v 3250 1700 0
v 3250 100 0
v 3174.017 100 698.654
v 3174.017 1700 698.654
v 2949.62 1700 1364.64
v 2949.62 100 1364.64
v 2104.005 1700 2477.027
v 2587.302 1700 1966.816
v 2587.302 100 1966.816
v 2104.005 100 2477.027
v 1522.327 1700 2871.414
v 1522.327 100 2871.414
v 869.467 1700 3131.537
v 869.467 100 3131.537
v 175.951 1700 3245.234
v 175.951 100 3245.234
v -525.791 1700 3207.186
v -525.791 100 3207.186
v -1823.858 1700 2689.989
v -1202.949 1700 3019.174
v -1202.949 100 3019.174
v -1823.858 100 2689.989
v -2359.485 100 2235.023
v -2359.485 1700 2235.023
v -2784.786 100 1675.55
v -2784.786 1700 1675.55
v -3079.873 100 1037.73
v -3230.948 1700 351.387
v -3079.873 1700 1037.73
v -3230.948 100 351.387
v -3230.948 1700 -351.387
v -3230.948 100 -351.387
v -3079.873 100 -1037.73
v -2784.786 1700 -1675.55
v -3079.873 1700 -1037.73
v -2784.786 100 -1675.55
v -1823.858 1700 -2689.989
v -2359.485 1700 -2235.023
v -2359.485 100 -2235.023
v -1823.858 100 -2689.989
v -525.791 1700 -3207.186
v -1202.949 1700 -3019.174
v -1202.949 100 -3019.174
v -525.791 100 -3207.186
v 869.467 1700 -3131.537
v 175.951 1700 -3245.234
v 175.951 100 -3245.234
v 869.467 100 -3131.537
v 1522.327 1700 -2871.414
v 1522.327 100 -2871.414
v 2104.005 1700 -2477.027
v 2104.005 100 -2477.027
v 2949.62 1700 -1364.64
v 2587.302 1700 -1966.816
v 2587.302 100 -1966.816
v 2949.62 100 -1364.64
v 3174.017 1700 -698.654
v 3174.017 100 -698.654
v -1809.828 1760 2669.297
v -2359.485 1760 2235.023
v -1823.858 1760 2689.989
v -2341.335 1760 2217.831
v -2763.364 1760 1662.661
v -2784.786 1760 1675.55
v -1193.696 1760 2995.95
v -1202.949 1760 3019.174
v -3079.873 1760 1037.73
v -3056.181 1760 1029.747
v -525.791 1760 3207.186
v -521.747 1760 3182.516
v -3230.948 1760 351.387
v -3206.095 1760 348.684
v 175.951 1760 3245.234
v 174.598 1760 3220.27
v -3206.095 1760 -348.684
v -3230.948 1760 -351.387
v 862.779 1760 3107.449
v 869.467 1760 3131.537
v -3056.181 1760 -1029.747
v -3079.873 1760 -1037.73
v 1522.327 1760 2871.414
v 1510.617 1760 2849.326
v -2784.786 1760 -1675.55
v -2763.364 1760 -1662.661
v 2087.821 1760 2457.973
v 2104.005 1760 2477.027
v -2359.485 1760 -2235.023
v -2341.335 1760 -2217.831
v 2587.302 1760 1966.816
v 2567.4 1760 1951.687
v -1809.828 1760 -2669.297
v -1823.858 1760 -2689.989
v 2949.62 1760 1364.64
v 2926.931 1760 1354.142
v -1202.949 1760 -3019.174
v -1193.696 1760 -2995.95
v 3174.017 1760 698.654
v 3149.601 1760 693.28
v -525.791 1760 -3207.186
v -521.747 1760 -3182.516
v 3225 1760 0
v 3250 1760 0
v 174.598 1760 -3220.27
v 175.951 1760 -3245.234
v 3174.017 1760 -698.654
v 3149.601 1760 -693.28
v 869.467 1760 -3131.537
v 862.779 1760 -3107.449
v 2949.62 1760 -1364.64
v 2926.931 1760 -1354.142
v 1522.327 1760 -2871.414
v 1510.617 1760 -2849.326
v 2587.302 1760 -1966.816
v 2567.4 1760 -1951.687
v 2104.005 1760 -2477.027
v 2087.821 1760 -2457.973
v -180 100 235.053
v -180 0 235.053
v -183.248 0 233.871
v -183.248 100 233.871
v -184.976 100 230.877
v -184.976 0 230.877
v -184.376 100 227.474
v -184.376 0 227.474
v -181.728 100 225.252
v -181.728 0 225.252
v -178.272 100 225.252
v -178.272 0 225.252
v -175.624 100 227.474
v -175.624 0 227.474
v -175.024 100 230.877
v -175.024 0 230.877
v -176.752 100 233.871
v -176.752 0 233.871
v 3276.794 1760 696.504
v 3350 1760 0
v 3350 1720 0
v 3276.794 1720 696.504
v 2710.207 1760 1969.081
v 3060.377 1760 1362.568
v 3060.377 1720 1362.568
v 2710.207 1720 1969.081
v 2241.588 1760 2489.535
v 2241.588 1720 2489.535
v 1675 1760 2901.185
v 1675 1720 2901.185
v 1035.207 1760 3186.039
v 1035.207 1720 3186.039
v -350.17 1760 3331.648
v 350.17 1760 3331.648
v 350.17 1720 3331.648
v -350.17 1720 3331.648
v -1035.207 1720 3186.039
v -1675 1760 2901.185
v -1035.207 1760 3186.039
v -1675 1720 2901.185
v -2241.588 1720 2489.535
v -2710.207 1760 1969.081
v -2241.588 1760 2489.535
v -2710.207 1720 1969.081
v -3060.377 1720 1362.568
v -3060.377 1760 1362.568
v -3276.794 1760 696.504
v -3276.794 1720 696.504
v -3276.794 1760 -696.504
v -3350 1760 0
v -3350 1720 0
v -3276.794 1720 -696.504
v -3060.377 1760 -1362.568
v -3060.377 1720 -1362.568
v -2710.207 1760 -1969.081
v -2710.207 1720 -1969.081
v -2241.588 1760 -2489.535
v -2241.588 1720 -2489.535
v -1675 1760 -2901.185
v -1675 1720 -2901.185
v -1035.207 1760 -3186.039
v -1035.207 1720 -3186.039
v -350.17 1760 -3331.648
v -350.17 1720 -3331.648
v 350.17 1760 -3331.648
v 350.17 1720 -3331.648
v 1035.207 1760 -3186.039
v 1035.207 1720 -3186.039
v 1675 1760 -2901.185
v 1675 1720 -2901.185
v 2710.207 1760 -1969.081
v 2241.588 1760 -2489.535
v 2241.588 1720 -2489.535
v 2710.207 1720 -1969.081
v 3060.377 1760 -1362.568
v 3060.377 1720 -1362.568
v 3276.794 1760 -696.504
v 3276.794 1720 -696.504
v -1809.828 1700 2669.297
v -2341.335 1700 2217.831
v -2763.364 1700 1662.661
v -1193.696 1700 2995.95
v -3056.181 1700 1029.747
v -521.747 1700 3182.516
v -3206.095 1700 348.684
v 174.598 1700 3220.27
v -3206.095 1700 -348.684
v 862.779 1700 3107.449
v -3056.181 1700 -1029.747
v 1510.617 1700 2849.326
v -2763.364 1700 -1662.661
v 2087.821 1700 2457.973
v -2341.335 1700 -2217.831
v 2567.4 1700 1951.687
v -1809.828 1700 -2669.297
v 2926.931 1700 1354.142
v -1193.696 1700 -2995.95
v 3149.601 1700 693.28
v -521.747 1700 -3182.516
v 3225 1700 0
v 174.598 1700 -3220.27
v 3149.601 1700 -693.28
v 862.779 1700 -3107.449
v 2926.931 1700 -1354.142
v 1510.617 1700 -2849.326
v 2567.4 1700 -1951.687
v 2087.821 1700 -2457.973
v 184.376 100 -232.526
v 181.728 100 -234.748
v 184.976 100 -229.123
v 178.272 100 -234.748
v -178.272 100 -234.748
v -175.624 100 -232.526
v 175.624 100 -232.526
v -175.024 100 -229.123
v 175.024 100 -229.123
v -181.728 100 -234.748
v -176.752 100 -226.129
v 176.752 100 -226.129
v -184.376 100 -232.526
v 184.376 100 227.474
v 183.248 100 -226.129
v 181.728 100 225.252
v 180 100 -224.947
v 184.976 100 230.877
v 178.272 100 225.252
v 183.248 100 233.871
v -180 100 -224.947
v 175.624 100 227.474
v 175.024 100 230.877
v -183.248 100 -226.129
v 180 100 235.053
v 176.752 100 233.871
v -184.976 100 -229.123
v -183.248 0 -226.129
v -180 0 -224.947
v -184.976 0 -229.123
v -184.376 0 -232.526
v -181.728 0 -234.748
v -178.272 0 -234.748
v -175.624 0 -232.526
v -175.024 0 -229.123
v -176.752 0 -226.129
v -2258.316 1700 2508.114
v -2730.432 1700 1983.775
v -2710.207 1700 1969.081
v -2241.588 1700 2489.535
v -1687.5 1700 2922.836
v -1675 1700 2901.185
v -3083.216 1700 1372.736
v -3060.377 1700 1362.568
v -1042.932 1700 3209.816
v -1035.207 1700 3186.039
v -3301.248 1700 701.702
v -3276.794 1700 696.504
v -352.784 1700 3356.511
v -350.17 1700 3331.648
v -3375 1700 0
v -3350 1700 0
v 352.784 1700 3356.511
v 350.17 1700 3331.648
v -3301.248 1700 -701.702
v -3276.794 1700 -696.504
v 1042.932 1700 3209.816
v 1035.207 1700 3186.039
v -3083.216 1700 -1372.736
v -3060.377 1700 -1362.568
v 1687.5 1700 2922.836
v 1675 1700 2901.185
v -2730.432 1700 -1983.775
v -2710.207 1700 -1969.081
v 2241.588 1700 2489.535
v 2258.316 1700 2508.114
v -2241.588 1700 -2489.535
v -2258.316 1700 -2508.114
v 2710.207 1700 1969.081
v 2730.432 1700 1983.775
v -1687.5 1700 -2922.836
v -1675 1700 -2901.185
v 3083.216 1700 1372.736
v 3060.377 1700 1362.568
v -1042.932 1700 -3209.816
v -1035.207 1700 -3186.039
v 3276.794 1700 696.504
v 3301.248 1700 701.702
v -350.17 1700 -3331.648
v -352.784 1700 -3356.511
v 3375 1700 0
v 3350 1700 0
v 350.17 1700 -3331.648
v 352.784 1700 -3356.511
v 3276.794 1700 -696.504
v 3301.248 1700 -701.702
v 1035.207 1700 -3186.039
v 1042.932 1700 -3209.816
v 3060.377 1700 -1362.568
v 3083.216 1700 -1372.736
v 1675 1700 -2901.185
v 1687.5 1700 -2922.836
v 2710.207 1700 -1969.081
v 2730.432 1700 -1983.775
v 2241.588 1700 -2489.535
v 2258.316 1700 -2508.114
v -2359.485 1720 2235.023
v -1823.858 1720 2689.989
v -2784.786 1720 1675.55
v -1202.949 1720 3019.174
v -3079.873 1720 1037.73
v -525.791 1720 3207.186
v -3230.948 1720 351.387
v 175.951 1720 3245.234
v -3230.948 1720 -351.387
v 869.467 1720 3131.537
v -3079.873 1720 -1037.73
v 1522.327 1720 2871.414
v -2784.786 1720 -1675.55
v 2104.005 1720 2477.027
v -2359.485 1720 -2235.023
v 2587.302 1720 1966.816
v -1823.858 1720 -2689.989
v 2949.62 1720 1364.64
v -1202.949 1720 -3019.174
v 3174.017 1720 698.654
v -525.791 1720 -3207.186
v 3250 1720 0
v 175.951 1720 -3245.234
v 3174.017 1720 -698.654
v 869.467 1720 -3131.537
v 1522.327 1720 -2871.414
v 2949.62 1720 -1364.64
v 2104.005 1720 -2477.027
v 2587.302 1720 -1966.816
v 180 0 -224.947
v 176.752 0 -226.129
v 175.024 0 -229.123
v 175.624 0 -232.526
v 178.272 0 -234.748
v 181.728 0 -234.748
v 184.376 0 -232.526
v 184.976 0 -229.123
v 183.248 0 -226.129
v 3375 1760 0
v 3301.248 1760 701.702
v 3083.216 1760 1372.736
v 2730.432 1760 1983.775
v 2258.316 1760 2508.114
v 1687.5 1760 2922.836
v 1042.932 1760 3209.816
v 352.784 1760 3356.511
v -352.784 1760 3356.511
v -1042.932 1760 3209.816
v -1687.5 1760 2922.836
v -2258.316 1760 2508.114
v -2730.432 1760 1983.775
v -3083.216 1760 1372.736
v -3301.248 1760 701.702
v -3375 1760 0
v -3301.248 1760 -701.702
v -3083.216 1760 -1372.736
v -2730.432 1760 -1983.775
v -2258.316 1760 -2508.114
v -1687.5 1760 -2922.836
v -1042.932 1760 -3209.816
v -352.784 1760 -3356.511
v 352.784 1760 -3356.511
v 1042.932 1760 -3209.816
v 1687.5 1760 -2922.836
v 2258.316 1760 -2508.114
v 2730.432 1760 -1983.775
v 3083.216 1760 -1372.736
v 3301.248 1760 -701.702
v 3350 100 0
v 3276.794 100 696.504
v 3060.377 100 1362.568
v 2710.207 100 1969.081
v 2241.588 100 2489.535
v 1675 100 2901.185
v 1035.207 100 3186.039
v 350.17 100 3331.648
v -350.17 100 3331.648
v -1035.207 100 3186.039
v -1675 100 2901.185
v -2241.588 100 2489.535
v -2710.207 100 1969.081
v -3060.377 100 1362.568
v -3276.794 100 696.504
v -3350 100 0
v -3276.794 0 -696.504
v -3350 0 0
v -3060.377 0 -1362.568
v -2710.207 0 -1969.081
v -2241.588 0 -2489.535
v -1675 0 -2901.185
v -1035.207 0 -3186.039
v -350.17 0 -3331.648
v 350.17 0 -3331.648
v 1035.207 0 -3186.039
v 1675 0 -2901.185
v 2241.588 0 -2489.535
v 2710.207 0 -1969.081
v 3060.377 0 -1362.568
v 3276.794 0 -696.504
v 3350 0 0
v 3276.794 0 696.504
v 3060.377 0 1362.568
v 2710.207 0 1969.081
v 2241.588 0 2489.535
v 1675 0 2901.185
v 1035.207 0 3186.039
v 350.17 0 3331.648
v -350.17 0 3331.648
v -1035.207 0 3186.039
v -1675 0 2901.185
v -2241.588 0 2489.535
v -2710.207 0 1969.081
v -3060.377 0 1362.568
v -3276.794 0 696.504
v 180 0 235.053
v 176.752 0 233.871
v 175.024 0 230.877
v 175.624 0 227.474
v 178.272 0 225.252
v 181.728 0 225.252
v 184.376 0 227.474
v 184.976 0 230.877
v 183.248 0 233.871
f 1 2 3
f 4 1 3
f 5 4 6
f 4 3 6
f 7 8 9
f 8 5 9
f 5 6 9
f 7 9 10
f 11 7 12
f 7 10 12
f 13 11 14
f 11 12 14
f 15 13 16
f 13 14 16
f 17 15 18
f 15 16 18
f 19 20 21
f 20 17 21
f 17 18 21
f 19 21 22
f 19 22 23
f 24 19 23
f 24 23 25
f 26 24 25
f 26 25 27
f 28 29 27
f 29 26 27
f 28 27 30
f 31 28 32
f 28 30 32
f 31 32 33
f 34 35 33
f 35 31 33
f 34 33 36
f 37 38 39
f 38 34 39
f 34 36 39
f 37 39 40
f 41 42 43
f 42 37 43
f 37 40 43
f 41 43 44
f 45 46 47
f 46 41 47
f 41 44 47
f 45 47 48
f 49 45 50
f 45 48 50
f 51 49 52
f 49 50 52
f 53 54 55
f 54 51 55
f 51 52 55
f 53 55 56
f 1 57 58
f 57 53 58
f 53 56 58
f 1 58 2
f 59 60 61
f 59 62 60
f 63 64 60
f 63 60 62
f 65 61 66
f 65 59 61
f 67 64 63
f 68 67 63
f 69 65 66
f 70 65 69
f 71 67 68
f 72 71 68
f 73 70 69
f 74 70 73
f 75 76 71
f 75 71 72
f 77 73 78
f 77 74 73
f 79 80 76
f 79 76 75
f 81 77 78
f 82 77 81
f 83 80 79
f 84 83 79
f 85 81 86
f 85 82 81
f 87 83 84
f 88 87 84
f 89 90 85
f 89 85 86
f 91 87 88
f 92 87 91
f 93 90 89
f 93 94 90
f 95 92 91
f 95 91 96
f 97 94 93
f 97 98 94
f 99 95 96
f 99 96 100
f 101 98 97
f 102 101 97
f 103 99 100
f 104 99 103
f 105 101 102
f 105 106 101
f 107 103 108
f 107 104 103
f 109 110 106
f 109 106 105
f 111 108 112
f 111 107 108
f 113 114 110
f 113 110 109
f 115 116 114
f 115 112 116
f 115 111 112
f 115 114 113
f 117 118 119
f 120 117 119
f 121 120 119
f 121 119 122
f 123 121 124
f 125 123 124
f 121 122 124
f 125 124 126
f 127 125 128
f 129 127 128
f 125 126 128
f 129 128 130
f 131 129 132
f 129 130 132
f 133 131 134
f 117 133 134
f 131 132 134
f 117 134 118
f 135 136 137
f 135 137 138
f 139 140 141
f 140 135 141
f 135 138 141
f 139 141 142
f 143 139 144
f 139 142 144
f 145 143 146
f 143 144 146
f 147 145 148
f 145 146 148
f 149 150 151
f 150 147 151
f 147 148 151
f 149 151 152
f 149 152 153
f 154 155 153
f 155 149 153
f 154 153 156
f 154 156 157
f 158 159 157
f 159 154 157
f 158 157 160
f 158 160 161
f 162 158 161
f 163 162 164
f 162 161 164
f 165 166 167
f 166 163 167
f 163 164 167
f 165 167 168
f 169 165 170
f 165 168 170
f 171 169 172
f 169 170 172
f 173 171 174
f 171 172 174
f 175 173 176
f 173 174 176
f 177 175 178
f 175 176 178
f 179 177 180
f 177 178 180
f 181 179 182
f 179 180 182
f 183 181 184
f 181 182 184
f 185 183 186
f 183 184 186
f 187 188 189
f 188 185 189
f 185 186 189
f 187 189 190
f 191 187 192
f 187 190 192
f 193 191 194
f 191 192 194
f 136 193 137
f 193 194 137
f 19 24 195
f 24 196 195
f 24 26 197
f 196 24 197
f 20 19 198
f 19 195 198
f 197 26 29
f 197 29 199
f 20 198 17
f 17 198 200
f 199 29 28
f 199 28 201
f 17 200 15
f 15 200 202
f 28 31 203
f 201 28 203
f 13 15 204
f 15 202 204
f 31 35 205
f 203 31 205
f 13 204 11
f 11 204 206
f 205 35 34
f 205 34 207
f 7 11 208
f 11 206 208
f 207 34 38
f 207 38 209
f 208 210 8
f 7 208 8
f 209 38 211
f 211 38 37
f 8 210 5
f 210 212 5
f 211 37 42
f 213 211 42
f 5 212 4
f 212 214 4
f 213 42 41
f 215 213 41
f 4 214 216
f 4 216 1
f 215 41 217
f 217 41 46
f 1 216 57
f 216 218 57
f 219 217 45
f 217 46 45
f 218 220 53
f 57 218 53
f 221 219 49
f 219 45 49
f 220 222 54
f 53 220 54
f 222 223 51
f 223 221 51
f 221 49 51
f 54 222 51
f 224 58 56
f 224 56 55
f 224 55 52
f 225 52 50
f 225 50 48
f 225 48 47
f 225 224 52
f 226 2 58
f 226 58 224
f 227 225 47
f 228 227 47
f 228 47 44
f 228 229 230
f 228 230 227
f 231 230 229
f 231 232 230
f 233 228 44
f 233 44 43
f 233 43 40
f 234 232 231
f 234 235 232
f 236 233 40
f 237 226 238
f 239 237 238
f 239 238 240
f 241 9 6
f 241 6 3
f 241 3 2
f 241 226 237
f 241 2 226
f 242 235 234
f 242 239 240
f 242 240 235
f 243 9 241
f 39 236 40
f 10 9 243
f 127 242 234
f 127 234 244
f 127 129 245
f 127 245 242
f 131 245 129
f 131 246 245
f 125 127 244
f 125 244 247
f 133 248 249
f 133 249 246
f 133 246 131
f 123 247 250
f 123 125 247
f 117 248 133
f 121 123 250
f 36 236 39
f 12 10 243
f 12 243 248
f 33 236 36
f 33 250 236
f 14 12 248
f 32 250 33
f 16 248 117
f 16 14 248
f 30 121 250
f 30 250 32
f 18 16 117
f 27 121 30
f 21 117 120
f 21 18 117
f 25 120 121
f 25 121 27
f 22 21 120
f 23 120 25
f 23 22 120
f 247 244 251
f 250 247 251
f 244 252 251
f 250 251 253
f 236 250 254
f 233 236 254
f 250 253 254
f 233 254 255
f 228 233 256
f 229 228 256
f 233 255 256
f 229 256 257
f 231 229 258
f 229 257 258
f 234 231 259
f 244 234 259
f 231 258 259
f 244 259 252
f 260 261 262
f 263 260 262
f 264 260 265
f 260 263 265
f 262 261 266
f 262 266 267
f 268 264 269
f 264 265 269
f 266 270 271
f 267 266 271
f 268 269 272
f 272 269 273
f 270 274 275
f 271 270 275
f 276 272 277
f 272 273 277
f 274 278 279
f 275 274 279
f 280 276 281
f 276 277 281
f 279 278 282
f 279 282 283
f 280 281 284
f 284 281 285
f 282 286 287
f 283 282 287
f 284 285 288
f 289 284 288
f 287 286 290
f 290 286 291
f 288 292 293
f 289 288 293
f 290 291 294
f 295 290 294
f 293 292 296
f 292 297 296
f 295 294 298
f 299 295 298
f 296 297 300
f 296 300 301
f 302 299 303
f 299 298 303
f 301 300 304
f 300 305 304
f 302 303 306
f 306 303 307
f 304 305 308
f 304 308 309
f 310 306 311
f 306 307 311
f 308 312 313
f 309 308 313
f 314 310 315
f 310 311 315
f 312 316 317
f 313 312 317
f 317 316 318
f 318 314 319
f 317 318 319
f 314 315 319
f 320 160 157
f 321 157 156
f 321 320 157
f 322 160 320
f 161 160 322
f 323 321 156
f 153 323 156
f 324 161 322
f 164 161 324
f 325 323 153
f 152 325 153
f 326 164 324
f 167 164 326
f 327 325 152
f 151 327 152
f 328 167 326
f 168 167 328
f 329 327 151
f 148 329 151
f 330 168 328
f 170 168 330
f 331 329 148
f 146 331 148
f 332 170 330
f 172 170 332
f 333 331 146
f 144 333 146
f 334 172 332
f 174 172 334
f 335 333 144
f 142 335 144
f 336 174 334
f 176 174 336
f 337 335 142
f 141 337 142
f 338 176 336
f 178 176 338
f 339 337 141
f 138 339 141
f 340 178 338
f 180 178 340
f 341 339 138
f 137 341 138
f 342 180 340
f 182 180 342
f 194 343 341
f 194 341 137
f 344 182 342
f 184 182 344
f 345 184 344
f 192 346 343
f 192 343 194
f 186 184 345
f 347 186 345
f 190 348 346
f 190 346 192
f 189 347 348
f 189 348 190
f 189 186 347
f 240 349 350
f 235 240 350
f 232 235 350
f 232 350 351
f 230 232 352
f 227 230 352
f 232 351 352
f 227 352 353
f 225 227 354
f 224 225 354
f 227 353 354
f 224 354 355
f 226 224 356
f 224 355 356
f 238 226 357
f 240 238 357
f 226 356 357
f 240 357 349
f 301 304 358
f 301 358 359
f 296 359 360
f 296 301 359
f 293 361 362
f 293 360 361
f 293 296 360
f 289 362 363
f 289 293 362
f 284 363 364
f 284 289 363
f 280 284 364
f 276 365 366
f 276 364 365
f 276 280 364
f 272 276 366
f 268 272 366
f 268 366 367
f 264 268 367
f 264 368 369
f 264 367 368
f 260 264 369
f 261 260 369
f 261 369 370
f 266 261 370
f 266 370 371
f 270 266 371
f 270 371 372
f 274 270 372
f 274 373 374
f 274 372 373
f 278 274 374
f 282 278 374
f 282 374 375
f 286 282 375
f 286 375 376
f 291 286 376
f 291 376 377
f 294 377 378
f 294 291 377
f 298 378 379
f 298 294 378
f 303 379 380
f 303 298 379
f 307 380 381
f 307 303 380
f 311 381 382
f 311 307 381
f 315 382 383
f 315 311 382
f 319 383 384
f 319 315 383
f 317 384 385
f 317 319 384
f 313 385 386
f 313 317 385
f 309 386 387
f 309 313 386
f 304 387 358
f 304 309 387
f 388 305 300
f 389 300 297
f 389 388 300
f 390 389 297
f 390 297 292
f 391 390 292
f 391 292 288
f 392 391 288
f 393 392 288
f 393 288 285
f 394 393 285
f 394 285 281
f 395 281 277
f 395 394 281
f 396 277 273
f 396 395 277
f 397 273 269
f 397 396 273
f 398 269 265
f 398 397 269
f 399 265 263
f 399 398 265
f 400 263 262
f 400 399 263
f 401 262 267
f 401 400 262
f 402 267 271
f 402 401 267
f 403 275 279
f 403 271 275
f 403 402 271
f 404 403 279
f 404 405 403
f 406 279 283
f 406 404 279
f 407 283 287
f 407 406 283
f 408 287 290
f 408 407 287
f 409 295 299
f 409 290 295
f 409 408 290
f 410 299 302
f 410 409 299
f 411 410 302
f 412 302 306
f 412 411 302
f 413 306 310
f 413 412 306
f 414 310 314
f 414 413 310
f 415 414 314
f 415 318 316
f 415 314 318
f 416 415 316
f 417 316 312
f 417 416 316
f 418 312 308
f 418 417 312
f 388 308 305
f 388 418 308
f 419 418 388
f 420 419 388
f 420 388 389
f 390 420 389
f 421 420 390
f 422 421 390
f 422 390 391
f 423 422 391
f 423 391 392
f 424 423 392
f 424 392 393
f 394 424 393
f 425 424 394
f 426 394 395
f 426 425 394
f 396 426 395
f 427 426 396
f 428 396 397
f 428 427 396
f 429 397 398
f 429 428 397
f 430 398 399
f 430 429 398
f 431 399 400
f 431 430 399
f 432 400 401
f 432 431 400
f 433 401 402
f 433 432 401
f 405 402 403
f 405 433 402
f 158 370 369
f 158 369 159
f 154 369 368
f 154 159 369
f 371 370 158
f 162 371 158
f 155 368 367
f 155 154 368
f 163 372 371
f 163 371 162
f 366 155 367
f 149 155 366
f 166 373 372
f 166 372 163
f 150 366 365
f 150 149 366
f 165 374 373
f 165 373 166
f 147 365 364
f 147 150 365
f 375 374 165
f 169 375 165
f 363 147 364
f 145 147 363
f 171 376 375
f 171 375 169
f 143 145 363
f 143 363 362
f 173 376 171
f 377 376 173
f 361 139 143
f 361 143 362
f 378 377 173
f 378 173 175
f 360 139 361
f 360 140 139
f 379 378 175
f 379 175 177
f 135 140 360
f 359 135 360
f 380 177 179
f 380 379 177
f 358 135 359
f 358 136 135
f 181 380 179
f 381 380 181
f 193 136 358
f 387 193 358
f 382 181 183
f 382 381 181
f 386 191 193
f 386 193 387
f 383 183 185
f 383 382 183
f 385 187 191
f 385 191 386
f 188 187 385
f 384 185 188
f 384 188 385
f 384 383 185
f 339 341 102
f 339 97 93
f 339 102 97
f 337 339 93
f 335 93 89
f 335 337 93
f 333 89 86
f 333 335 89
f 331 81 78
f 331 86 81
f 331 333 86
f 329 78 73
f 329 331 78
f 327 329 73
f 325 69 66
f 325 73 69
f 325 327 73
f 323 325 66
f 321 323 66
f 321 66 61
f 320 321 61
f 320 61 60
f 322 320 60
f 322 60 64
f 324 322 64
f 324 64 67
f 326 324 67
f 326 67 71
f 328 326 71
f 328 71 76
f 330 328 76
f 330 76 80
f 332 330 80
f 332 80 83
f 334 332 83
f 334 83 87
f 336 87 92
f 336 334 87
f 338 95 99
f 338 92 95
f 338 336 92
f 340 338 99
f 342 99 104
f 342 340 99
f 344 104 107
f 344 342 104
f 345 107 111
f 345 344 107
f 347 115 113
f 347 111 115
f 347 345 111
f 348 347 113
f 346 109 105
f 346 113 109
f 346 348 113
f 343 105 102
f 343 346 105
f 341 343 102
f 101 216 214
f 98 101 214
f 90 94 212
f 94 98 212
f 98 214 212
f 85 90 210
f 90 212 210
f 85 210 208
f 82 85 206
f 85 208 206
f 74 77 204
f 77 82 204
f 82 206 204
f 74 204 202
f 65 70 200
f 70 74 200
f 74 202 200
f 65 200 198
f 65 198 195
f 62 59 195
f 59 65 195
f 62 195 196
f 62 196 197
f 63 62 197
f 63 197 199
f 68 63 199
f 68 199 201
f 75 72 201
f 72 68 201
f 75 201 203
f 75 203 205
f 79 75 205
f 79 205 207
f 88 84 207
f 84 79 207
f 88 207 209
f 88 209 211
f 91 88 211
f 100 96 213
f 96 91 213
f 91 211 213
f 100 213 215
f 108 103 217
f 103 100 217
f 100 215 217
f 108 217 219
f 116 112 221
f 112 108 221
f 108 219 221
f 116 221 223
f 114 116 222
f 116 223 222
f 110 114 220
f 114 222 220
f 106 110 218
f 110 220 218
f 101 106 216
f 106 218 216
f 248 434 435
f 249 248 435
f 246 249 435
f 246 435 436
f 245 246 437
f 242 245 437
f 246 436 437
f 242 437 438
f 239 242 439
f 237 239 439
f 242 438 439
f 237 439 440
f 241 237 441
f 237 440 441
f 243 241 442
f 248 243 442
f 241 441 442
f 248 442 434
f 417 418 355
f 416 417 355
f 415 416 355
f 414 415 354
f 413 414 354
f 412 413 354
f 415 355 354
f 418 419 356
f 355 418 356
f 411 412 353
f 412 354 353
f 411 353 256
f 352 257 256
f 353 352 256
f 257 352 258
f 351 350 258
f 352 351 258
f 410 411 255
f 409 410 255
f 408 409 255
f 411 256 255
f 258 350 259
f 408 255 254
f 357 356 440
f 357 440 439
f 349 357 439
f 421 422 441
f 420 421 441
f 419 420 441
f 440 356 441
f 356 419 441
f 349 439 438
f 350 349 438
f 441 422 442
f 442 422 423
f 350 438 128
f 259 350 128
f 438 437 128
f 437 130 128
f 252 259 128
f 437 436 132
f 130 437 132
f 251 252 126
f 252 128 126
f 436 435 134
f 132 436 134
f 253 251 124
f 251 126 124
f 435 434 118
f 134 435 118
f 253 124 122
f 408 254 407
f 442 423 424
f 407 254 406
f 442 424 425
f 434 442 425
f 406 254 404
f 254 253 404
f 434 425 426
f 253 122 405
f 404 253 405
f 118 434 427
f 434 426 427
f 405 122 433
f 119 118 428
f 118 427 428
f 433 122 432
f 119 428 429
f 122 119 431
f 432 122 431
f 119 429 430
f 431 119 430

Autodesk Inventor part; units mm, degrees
ref_plane "YZ Plane" through (0, 0, 0) normal (1, 0, 0) x (0, 1, 0)
sketch "Sketch1" plane through (0, 0, 0) normal (0, 1, 0) x (-1, 0, 0)
  circle A0 centre (0, 0) radius 3350
  dimension "d1" = 6700
extrude "Extrusion1" add sketch "Sketch1" along normal blind 100
sketch "Sketch2" plane through (0, 100, 0) normal (0, 1, 0) x (1, 0, 0)
  circle A0 centre (0, 0) radius 3250
  circle A1 centre (0, 0) radius 3350
extrude "Extrusion2" add sketch "Sketch2" along normal blind 1600
ref_plane "Work Plane1" through (0, 1700, 0) normal (0, 1, 0) x (1, 0, 0)
sketch "Sketch3" plane through (0, 1700, 0) normal (0, 1, 0) x (1, 0, 0)
  circle A0 centre (0, 0) radius 3225
  circle A1 centre (0, 0) radius 3375
extrude "Extrusion3" add sketch "Sketch3" along normal blind 20
ref_plane "Work Plane2" through (0, 1720, 0) normal (0, 1, 0) x (1, 0, 0)
sketch "Sketch4" plane through (0, 1720, 0) normal (0, 1, 0) x (1, 0, 0)
  circle A0 centre (0, 0) radius 3225
  circle A1 centre (0, 0) radius 3375
  circle A2 centre (0, 0) radius 3250
  circle A3 centre (0, 0) radius 3250 projected
  circle A4 centre (0, 0) radius 3350
extrude "Extrusion4" add sketch "Sketch4" along normal blind 40
sketch "Sketch5" plane through (0, 100, 0) normal (0, 1, 0) x (1, 0, 0)
  point P0 (180, -230)
  point P1 (-180, -230)
  point P2 (180, 230)
  point P3 (-180, 230)
hole "Hole1" at (180, 100, 230) at (-180, 100, 230) at (180, 100, -230) at (-180, 100, -230) direction (0, -1, 0) diameter 10.106 end through all thread size "M12x1.75" class "6H" standard "ISO Metric profile"
properties part number "DomeFloorOldMeasurements"
